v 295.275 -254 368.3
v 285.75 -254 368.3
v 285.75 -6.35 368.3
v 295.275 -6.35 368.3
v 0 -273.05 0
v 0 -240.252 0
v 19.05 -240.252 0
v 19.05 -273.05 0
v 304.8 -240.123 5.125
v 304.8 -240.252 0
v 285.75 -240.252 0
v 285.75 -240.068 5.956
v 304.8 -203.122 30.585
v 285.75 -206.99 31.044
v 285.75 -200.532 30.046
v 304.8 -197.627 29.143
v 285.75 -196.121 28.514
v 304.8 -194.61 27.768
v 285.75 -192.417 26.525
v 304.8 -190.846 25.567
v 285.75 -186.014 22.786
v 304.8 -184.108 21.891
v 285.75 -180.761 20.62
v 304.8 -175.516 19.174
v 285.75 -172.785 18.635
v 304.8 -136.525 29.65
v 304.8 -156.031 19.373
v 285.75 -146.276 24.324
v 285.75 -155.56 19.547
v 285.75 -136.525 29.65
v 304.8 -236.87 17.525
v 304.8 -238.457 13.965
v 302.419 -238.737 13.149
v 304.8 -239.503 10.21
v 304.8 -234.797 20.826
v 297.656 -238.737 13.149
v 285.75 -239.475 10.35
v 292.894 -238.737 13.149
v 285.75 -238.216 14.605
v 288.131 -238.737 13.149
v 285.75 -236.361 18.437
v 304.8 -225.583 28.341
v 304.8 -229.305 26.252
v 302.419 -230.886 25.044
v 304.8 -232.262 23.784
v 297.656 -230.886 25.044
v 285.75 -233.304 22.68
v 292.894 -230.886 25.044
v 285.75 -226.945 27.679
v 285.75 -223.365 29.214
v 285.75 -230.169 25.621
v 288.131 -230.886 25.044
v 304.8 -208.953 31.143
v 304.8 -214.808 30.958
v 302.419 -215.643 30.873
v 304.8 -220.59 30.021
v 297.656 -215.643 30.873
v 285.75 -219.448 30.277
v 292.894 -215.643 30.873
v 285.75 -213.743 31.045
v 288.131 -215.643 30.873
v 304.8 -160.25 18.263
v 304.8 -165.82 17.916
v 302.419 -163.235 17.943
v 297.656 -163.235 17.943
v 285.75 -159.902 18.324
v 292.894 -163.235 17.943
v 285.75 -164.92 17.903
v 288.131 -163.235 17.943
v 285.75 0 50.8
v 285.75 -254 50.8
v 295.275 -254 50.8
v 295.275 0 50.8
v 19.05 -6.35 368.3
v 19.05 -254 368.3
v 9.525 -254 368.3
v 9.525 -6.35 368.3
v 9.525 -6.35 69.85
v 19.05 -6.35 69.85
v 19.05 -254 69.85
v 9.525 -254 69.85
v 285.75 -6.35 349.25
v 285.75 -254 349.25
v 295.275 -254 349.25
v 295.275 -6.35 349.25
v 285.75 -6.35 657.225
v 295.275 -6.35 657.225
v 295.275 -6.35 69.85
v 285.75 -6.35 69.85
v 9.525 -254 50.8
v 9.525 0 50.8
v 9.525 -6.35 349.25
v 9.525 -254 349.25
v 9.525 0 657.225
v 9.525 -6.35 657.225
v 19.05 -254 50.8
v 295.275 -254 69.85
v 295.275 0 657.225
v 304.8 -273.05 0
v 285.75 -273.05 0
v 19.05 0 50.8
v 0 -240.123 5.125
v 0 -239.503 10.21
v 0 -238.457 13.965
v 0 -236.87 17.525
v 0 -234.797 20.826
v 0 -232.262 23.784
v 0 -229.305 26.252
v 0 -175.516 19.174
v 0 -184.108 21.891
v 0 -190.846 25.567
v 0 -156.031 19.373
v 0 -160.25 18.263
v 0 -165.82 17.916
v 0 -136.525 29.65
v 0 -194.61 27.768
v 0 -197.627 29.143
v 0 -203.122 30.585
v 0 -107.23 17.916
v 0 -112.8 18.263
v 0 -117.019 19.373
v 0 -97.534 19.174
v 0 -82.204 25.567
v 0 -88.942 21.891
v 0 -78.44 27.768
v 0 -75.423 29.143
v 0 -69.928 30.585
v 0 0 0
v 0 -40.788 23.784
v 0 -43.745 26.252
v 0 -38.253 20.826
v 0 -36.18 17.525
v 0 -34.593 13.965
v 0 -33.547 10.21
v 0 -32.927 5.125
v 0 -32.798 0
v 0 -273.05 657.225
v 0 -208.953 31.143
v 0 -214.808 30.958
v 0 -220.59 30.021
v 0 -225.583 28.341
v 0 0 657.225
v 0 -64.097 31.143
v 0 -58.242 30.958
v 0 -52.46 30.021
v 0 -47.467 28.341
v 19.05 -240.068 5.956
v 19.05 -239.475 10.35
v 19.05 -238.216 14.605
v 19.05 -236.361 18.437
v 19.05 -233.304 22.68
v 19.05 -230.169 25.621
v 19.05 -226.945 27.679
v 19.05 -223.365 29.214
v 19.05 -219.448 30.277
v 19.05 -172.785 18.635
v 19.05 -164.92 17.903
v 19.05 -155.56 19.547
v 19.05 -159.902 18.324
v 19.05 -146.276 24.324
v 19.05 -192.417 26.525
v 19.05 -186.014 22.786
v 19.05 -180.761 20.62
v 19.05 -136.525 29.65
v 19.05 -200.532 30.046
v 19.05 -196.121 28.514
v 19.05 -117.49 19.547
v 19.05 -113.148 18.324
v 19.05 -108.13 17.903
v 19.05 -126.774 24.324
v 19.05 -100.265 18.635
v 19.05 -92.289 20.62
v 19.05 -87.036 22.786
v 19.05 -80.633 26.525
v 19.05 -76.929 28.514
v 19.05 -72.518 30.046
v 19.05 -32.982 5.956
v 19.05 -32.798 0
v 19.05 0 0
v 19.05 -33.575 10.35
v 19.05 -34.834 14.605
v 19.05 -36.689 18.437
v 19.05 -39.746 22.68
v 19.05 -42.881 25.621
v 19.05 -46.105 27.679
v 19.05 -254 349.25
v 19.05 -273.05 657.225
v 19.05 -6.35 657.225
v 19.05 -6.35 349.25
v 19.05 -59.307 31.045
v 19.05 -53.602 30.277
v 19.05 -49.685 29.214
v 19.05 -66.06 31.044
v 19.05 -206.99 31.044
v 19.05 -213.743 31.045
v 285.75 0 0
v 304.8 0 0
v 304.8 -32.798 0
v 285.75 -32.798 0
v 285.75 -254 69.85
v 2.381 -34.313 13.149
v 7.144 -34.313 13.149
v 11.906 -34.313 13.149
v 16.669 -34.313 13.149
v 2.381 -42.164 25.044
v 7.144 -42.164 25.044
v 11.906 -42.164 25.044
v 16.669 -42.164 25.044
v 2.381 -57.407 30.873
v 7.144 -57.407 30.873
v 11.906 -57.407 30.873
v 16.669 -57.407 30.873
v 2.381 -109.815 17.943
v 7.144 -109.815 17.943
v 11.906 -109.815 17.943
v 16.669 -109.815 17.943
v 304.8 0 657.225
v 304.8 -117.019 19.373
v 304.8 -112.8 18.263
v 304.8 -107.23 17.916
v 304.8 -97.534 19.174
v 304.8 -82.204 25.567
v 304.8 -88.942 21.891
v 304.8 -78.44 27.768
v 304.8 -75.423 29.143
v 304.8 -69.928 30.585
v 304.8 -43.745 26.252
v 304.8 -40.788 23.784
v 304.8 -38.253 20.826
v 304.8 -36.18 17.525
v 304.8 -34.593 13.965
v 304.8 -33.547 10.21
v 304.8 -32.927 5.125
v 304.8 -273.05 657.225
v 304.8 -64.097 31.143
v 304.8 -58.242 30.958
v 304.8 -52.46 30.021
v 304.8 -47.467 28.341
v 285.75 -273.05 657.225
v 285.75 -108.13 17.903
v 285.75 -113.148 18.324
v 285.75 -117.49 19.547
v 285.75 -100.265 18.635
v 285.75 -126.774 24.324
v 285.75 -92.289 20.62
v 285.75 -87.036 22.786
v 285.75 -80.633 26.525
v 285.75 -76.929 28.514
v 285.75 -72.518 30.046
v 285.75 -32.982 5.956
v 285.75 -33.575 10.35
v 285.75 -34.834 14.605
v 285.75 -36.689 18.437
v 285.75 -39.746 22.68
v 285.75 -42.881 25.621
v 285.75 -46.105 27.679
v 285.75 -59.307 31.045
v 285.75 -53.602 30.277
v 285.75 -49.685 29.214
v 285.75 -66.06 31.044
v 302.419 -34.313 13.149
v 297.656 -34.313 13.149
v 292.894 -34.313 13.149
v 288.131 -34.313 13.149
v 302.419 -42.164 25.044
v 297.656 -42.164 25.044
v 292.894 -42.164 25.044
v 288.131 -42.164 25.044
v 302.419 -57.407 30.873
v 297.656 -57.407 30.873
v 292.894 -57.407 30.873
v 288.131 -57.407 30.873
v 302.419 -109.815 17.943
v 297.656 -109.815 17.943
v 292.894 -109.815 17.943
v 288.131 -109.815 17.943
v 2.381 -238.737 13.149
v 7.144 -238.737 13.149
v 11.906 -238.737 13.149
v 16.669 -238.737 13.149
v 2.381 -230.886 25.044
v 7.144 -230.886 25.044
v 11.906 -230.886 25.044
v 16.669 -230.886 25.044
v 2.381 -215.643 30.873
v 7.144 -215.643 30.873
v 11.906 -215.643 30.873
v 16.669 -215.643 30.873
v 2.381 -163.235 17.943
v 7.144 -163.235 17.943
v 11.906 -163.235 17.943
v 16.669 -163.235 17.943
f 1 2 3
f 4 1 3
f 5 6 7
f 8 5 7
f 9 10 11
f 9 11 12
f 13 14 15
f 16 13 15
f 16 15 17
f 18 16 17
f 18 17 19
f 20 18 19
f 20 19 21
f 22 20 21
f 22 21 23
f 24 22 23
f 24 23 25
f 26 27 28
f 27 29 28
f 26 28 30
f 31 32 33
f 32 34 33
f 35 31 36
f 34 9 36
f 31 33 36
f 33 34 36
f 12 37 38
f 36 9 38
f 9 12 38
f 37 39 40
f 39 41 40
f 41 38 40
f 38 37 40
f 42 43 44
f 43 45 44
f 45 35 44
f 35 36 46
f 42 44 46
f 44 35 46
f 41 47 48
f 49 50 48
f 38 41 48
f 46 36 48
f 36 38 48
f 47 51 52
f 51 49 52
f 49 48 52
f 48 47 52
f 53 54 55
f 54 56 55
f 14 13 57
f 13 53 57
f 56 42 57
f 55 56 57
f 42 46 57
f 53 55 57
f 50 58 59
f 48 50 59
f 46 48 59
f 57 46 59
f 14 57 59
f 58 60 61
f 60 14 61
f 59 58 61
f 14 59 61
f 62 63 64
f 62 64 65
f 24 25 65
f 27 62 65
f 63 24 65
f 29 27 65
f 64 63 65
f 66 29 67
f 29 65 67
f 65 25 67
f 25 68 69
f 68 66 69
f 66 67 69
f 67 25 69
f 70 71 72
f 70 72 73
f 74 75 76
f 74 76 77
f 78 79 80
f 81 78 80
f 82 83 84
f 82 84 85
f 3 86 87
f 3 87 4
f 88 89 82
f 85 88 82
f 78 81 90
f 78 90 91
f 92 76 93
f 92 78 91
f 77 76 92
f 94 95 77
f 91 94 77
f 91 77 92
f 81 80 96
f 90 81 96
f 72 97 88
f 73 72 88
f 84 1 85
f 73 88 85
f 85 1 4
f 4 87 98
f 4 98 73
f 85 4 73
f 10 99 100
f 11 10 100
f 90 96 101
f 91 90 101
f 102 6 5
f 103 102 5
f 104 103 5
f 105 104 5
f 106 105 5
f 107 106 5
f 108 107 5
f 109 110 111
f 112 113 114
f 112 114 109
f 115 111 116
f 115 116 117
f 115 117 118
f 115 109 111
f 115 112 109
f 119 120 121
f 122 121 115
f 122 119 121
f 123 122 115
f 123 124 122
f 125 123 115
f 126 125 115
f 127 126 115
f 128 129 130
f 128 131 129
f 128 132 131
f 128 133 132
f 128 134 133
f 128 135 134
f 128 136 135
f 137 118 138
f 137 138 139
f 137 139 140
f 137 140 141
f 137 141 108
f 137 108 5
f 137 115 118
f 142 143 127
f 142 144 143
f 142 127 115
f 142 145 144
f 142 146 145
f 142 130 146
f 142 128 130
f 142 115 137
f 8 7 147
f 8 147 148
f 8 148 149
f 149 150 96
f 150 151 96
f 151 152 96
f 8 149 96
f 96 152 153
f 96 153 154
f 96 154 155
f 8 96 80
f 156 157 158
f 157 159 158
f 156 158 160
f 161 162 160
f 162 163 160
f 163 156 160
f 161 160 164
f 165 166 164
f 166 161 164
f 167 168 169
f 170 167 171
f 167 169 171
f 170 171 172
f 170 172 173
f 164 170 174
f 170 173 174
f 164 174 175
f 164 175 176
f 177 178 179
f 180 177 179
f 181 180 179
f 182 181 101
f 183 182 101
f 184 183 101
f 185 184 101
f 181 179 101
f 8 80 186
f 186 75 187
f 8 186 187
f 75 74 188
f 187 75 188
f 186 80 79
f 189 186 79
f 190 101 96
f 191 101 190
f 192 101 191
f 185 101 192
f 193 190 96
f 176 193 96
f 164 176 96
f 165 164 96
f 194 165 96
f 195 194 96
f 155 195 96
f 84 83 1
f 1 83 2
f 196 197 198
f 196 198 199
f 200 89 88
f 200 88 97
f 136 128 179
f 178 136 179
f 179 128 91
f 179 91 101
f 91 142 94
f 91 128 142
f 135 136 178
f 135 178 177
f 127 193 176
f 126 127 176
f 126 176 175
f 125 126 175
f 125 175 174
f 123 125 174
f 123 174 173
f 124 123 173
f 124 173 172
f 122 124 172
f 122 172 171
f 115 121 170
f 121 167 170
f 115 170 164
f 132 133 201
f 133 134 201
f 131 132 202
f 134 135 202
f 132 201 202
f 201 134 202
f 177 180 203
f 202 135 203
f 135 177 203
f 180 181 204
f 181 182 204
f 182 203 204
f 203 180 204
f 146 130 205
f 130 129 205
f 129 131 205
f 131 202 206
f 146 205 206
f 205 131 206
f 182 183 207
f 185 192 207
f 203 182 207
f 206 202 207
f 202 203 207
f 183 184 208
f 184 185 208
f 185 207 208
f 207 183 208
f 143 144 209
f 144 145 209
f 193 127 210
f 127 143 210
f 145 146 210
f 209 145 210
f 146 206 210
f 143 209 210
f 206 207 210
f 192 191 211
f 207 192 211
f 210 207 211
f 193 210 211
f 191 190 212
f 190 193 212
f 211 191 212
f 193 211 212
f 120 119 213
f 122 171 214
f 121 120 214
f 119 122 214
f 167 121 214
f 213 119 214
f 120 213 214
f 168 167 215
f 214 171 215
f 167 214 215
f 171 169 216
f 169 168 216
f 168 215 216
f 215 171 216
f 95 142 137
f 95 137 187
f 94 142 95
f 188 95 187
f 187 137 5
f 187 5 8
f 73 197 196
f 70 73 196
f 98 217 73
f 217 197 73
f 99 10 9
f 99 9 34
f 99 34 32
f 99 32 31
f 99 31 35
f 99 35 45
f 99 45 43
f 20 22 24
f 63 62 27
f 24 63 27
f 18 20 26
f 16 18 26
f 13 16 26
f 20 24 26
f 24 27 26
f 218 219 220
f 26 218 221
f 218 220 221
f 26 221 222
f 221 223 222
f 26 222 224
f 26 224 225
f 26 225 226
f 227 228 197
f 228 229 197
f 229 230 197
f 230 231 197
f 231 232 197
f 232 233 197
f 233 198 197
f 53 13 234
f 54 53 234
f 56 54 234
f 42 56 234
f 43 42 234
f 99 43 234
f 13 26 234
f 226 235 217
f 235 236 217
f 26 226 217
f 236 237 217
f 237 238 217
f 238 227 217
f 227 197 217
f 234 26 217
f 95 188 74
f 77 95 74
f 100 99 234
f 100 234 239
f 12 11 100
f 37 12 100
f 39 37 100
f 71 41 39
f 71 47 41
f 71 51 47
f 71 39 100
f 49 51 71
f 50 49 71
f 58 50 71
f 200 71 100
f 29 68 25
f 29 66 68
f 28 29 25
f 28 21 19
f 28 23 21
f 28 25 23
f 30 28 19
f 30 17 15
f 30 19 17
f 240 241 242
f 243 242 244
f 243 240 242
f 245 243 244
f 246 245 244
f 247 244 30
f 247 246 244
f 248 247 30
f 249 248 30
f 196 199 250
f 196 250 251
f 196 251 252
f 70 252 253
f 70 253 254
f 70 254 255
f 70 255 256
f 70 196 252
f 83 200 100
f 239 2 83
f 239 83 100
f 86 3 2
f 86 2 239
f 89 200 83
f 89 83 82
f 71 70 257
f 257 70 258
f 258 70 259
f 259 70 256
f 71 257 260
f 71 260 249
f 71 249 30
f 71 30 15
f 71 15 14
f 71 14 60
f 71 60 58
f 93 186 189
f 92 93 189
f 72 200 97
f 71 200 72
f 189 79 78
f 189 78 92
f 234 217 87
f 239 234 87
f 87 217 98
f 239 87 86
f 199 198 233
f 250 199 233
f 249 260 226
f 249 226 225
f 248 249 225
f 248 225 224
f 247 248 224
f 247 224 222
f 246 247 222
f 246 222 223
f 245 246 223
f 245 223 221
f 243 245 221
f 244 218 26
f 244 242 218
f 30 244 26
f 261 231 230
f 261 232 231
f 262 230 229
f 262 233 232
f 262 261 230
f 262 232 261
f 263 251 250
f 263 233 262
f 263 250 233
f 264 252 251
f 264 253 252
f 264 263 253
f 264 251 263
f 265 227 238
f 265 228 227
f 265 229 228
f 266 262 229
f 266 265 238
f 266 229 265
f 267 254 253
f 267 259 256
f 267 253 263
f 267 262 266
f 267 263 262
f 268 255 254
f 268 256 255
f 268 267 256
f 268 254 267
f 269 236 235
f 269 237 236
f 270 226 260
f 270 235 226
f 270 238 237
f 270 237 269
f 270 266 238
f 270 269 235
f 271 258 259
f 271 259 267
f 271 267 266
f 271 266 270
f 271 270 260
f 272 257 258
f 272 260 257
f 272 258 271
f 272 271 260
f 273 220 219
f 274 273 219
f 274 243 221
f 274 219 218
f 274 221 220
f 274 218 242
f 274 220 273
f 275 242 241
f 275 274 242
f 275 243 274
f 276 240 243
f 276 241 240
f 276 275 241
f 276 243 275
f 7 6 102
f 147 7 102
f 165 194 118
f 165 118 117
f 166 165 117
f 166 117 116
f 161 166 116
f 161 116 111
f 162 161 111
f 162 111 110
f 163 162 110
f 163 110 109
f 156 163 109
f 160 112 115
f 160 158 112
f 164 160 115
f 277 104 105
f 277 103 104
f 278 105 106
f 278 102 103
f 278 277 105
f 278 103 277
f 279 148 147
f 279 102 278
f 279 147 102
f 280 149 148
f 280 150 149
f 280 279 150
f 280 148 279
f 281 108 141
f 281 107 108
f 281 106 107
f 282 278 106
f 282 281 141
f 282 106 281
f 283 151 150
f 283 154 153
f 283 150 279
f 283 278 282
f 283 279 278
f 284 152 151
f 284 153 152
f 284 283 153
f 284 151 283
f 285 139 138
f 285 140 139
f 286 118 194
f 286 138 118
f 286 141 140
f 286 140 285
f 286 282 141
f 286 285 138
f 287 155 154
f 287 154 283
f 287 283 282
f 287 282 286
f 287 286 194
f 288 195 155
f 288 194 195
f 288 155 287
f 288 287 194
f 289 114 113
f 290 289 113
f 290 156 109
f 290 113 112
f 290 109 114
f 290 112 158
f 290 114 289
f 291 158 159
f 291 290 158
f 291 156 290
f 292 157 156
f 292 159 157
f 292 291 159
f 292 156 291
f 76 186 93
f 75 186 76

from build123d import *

# Parameters (mm, degrees)
F0_W     = 19.05
F0_H     = 657.225
F1_DEPTH = 273.05
F2_W     = 6.35
F2_H     = 19.05
F2_H_2   = 288.925
F2_W_2   = 247.65
F2_H_3   = 279.4
F3_DEPTH = 9.525
F5_DEPTH = 25.4


with BuildPart() as f1:
    # F0 (on Front) → F1 (new body)
    with BuildSketch(Plane.XZ):
        with Locations((9.525, 328.6125)):
            Rectangle(F0_W, F0_H)
    extrude(amount=F1_DEPTH)

    # F2 (on face) → F3 (cut)
    with BuildSketch(Plane.YZ.offset(19.05)):
        with Locations((-3.175, 358.775)):
            Rectangle(F2_W, F2_H)
        with Locations((-3.175, 512.7625)):
            Rectangle(F2_W, F2_H_2)
        with Locations((-130.175, 358.775)):
            Rectangle(F2_W_2, F2_H)
        with Locations((-3.175, 209.55)):
            Rectangle(F2_W, F2_H_3)
        Polygon((0, 50.8), (0, 69.85), (-6.35, 69.85), (-254, 69.85), (-254, 50.8), align=None)
    extrude(amount=-F3_DEPTH, mode=Mode.SUBTRACT)

    # F4 (on face) → F5 (cut)
    with BuildSketch(Plane.YZ.offset(19.05)):
        with BuildLine():
            Line((-240.2522563934, 0), (-136.525, 0))
            Line((-136.525, 0), (-136.525, 29.6503286809))
            add(Edge.make_bspline(
                [(-240.2522563934, 0), (-240.2156873879, 4.1745950735), (-240.1395307598, 12.9532015232), (-231.7572735519, 26.602763893), (-216.8034780579, 31.9415278641), (-196.7156415017, 30.8262784524), (-185.6780505896, 20.7363519544), (-162.8031207123, 16.2873893766), (-150.7498544318, 21.3307274369), (-141.0247415194, 27.5648176301), (-136.525, 29.6503286809)],
                knots=[0, 0, 0, 0, 0.112021792, 0.2325315361, 0.3559611943, 0.4920857255, 0.6136957742, 0.7599718075, 0.8741056104, 1, 1, 1, 1], degree=3))
        make_face()
        with BuildLine():
            Line((-136.525, 29.6503286809), (-136.525, 0))
            Line((-136.525, 0), (-32.7977436066, 0))
            add(Edge.make_bspline(
                [(-32.7977436066, 0), (-32.8343126121, 4.1745950735), (-32.9104692402, 12.9532015232), (-41.2927264481, 26.602763893), (-56.2465219421, 31.9415278641), (-76.3343584983, 30.8262784524), (-87.3719494104, 20.7363519544), (-110.2468792877, 16.2873893766), (-122.3001455682, 21.3307274369), (-132.0252584806, 27.5648176301), (-136.525, 29.6503286809)],
                knots=[0, 0, 0, 0, 0.112021792, 0.2325315361, 0.3559611943, 0.4920857255, 0.6136957742, 0.7599718075, 0.8741056104, 1, 1, 1, 1], degree=3))
        make_face()
    extrude(amount=-F5_DEPTH, mode=Mode.SUBTRACT)


with BuildPart() as f7_1:
    # F7: instance of F1
    add(f1.part.mirror(Plane.YZ.offset(152.4)))


solid = Compound([f1.part, f7_1.part])
